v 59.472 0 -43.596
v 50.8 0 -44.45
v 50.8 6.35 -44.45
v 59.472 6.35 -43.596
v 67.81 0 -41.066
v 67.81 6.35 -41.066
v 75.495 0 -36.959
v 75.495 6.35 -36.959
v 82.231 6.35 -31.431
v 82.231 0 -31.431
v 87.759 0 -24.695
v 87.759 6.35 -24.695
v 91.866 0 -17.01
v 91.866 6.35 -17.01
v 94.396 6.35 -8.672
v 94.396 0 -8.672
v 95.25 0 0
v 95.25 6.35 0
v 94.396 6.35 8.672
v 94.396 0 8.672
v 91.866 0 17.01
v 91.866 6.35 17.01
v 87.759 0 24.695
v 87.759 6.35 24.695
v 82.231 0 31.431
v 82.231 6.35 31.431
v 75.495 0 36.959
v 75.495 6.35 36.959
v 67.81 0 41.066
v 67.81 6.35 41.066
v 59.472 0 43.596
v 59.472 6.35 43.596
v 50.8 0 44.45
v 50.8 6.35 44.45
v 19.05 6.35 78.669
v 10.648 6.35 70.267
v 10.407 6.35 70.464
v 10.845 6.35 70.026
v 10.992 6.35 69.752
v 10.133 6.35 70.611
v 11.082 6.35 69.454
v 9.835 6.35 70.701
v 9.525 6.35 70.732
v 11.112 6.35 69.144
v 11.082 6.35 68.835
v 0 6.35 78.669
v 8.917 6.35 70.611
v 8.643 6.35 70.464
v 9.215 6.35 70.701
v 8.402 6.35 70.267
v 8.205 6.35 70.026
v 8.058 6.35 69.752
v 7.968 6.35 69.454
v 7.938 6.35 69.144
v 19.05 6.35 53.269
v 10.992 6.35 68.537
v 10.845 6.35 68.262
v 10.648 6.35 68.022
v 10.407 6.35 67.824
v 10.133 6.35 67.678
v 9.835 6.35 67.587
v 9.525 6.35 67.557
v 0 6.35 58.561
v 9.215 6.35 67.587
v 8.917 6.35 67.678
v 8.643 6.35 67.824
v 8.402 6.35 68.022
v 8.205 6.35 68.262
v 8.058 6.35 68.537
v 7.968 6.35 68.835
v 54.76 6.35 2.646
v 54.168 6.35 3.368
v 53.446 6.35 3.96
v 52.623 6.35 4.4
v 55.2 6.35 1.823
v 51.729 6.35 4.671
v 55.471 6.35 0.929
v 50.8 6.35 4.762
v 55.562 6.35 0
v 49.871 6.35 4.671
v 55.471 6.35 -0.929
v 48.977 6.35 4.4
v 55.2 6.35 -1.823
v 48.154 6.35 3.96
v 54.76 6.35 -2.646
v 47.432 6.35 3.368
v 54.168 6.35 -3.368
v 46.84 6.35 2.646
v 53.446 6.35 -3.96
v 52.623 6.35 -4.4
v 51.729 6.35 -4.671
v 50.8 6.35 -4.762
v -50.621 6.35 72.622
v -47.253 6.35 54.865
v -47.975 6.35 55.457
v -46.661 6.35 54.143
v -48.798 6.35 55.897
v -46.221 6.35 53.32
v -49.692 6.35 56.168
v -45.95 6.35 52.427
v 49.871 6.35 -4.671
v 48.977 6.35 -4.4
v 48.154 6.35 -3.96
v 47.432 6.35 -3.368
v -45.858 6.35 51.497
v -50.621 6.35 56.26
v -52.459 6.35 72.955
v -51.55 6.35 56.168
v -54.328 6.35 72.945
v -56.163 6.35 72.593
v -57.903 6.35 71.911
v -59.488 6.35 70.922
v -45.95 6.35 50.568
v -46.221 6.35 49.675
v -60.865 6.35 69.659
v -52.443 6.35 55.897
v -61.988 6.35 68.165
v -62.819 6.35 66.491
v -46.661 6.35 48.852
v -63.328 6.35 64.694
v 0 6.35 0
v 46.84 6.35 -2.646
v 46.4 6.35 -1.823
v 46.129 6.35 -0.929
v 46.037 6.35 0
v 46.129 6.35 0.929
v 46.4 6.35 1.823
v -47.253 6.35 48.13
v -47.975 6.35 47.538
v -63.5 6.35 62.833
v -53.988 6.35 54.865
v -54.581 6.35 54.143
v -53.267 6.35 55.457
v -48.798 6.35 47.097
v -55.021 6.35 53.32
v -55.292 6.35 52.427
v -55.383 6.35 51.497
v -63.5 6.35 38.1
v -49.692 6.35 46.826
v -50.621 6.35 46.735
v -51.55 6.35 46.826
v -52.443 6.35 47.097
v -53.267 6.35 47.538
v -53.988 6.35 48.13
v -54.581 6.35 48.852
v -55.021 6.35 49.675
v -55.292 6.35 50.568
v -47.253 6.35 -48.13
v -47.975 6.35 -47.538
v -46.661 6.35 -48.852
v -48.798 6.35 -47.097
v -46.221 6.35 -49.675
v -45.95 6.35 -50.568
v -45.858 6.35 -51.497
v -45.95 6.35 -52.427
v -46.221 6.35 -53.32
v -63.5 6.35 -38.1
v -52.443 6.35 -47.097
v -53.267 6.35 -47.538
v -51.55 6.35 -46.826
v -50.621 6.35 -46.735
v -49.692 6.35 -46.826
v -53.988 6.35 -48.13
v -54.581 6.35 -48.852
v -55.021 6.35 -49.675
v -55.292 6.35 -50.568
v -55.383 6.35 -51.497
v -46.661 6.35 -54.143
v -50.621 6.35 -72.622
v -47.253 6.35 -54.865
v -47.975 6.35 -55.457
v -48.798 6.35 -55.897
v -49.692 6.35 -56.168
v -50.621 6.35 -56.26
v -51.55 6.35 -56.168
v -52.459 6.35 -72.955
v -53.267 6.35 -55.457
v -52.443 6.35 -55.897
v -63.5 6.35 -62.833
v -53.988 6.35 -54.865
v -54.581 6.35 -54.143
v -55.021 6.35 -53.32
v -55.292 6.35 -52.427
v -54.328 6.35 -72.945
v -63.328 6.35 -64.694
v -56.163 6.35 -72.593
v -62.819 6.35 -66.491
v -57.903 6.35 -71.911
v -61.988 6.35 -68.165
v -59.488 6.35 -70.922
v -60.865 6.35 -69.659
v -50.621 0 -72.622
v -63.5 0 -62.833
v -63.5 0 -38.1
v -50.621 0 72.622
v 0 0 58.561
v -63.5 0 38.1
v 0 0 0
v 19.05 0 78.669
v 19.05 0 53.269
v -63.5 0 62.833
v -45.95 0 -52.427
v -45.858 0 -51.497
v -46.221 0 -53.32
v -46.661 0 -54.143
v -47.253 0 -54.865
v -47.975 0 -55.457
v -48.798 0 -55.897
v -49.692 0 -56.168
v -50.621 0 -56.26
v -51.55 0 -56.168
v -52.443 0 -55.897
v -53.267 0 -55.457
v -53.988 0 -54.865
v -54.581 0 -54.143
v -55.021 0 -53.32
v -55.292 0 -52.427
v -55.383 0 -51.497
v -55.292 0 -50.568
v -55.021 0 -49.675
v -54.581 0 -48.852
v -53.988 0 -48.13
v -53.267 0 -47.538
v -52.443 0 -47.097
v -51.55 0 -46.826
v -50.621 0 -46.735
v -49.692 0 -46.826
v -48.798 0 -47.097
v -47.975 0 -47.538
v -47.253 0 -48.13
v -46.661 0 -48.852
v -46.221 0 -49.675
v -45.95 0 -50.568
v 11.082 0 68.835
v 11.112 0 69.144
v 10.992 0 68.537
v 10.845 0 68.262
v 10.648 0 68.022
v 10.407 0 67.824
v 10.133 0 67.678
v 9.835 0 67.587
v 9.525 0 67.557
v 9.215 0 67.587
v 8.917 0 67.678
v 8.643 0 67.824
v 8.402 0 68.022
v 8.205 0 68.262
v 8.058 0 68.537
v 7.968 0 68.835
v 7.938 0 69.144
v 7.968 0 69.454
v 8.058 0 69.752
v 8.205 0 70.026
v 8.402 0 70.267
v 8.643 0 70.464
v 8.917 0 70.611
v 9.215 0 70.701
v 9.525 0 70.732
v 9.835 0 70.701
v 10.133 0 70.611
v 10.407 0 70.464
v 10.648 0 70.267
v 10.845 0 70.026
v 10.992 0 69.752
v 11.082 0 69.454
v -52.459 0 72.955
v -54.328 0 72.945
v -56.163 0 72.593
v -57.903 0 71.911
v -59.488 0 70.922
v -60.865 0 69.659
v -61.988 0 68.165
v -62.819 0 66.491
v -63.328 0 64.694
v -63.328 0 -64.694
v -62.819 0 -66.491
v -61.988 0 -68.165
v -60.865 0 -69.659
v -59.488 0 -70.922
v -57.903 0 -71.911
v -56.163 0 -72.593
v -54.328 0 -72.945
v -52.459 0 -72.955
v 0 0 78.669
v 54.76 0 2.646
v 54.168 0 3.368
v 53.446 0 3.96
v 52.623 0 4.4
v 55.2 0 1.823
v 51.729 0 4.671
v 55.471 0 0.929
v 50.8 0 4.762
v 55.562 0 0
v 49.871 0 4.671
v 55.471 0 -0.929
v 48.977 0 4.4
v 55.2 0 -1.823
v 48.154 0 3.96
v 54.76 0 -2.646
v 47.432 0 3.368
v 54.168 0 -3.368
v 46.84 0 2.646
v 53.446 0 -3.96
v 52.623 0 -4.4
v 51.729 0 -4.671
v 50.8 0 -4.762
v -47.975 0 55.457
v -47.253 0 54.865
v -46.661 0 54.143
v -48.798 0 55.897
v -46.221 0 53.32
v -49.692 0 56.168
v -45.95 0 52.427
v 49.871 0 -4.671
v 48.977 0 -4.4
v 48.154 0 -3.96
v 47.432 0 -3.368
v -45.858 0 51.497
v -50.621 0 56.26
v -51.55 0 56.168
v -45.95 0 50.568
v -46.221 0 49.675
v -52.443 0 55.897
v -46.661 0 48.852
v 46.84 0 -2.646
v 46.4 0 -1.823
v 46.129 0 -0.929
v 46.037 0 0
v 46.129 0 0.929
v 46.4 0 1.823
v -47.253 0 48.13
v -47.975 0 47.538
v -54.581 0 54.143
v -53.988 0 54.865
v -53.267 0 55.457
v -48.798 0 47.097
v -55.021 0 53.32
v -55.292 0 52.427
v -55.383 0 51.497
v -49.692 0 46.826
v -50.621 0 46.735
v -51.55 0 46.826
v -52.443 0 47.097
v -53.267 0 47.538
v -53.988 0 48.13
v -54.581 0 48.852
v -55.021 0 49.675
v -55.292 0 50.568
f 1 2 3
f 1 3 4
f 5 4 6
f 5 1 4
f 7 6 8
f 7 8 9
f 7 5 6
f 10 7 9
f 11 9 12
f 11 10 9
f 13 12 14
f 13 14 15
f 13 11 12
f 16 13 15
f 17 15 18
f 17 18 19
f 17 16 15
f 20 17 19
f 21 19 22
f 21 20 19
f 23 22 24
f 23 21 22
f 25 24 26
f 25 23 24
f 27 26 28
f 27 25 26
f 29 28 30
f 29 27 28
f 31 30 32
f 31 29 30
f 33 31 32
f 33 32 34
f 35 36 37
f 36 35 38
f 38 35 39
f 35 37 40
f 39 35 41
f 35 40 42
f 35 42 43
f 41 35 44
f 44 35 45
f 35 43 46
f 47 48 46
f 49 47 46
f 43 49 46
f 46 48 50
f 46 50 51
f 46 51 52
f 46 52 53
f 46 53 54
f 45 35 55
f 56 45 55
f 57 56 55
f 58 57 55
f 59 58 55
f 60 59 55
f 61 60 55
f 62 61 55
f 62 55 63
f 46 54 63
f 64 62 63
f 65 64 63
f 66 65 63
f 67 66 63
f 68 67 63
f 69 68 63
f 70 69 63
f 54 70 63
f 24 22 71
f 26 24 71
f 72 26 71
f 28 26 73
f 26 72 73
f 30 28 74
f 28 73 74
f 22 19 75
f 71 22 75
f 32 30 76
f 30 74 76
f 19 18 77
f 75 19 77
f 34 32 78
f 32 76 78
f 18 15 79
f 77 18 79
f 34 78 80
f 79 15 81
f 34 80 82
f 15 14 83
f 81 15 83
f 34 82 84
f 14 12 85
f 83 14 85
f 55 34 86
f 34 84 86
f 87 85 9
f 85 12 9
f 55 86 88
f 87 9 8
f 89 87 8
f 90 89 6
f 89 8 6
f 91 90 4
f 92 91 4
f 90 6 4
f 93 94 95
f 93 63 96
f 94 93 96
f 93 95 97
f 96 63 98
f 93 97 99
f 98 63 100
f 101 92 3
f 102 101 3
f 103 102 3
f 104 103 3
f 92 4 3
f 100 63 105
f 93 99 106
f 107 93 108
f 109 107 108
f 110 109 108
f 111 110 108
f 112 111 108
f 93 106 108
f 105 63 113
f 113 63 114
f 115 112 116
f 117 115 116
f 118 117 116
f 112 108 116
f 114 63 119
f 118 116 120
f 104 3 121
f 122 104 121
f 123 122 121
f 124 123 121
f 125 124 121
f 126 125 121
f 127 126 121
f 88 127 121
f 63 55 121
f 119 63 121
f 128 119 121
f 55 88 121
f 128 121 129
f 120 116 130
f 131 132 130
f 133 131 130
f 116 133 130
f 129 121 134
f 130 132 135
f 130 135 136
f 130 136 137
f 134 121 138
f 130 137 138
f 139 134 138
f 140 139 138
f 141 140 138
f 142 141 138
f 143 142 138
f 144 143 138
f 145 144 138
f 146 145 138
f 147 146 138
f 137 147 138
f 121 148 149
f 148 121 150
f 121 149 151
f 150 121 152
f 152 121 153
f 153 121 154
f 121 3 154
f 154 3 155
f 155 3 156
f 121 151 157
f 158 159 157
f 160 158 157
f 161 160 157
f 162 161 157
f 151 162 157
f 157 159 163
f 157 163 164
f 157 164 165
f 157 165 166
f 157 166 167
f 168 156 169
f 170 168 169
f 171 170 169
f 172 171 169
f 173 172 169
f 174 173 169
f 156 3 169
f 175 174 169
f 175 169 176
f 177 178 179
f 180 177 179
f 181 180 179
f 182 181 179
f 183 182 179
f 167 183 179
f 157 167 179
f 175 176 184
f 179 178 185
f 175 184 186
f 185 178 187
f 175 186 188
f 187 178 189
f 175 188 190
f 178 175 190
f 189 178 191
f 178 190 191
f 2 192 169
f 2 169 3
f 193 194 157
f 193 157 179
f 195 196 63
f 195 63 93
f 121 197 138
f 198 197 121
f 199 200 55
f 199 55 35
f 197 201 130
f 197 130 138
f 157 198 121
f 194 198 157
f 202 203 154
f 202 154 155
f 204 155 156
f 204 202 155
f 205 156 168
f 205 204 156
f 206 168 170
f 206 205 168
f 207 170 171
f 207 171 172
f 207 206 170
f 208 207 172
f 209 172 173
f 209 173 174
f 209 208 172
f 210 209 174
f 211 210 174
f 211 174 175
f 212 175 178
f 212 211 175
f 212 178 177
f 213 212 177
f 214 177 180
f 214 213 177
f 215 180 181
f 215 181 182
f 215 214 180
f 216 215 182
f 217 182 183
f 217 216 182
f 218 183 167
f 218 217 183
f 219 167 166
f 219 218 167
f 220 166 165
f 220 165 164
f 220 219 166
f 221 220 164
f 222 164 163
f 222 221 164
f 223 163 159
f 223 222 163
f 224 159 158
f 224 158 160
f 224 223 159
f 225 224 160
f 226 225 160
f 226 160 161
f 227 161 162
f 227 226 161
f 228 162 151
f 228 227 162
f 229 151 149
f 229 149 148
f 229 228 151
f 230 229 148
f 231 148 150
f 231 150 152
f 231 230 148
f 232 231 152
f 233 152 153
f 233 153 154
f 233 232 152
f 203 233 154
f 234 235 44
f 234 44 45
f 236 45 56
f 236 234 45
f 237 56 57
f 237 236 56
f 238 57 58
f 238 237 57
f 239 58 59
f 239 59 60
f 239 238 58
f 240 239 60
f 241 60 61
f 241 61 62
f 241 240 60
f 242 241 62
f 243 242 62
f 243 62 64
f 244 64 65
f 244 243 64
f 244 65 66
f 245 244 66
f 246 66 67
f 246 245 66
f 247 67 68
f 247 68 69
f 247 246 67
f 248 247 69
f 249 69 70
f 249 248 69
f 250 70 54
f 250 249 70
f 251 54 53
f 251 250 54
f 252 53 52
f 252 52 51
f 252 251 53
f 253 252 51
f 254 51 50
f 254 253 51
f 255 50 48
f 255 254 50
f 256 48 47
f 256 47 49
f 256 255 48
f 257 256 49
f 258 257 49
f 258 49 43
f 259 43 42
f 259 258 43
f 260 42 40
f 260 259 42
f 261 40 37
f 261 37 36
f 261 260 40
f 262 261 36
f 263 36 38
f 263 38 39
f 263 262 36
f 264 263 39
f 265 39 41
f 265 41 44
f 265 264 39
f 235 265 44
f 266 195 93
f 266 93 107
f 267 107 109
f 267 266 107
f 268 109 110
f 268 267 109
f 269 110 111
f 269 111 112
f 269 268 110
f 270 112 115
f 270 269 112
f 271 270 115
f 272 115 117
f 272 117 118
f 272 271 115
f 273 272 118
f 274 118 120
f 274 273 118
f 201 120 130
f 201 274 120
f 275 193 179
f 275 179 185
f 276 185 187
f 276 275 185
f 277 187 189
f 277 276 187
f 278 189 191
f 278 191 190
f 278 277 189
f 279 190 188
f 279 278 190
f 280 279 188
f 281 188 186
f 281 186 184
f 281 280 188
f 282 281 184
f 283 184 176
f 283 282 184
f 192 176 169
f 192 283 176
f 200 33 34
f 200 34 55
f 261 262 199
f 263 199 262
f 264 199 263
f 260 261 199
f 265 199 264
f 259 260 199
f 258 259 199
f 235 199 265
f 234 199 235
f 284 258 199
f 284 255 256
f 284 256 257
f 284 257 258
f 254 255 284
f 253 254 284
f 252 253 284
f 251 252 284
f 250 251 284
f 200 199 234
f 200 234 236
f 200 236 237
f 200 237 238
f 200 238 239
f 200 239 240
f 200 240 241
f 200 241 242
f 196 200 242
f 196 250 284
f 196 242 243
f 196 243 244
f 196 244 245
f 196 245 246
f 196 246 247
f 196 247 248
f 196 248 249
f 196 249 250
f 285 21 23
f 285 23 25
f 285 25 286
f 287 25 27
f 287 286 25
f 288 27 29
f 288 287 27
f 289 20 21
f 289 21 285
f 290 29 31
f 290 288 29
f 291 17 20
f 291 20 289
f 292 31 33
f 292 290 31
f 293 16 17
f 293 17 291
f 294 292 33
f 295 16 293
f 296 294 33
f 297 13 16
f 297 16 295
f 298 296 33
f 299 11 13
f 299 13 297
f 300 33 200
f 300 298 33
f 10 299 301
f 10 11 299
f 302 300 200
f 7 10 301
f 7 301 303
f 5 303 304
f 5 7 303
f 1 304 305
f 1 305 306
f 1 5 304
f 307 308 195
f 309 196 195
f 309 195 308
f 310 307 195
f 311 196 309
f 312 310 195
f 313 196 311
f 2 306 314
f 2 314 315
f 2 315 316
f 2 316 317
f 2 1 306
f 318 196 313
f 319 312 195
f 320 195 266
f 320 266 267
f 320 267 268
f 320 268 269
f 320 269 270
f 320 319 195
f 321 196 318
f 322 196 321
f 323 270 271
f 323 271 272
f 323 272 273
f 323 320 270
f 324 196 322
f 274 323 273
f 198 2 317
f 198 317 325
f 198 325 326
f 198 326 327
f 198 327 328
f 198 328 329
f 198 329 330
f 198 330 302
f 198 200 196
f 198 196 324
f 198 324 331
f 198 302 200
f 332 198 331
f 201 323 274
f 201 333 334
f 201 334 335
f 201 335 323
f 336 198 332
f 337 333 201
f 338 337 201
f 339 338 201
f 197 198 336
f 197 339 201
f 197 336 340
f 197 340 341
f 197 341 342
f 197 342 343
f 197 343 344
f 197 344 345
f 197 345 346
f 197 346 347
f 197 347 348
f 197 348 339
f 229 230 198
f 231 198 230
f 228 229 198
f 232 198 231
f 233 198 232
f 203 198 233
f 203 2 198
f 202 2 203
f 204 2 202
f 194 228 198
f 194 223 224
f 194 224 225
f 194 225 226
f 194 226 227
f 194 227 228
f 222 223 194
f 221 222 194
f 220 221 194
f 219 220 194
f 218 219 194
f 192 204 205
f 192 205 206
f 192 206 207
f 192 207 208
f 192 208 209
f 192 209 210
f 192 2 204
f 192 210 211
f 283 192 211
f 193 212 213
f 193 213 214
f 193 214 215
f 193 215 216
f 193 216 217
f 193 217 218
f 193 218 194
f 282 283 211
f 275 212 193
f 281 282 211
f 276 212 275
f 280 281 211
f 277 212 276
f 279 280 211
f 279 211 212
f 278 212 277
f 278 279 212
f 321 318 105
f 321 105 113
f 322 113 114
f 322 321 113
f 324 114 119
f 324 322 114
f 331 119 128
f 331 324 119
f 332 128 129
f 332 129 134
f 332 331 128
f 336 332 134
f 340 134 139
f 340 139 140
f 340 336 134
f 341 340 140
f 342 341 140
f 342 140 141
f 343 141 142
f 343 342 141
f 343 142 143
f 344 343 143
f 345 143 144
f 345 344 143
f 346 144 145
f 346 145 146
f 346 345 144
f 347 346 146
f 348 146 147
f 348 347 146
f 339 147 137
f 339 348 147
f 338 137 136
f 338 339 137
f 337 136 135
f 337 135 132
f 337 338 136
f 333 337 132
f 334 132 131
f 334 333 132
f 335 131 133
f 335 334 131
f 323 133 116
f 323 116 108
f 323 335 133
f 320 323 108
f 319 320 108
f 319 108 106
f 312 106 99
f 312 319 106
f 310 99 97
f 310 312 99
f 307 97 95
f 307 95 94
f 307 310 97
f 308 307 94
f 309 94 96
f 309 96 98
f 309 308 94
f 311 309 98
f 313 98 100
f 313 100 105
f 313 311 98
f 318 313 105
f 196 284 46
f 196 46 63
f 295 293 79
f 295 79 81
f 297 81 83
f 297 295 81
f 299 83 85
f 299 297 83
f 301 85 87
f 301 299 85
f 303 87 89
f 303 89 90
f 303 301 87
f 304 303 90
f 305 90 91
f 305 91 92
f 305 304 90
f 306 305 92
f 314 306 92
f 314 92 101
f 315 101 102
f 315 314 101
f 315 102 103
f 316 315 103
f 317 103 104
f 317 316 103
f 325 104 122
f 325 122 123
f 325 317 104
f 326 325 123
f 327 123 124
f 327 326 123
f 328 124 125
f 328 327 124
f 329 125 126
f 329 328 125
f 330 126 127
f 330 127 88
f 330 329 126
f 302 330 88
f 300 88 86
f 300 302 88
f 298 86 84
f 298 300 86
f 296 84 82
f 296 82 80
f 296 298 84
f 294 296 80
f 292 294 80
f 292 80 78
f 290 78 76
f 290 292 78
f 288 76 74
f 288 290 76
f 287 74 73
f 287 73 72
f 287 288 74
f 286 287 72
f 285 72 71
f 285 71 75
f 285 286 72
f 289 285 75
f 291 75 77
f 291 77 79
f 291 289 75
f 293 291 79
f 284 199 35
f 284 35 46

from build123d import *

# Parameters (mm, degrees)
SKETCH1_R           = 4.7625
SKETCH1_R_2         = 1.5875
BOSS_EXTRUDE1_DEPTH = 6.35


with BuildPart() as part:
    # Sketch1 → Boss-Extrude1 (new body)
    with BuildSketch(Plane(origin=(0, 0, 0), x_dir=(1, 0, 0), z_dir=(0, 1, 0))):
        with BuildLine():
            Line((-50.620738344, 72.622427318), (50.8, 44.45))
            ThreePointArc((50.8, 44.45), (95.25, 0), (50.8, -44.45))
            Line((50.8, -44.45), (19.05, -53.269444444))
            Line((19.05, -53.269444444), (19.05, -78.669444444))
            Line((19.05, -78.669444444), (0, -78.669444444))
            Line((0, -78.669444444), (0, -58.561111111))
            Line((0, -58.561111111), (-50.620738344, -72.622427318))
            ThreePointArc((-50.620738344, -72.622427318), (-59.488085132, -70.921759488), (-63.5, -62.833085356))
            Line((-63.5, -62.833085356), (-63.5, -38.1))
            Line((-63.5, -38.1), (0, 0))
            Line((0, 0), (-63.5, 38.1))
            Line((-63.5, 38.1), (-63.5, 62.833085356))
            ThreePointArc((-63.5, 62.833085356), (-59.488085132, 70.921759488), (-50.620738344, 72.622427318))
        make_face()
        with Locations((50.8, 0)):
            Circle(SKETCH1_R, mode=Mode.SUBTRACT)
        with Locations((-50.620738344, 51.497435162)):
            Circle(SKETCH1_R, mode=Mode.SUBTRACT)
        with Locations((-50.620738344, -51.497435162)):
            Circle(SKETCH1_R, mode=Mode.SUBTRACT)
        with Locations((9.525, -69.144444444)):
            Circle(SKETCH1_R_2, mode=Mode.SUBTRACT)
    extrude(amount=BOSS_EXTRUDE1_DEPTH)


solid = part.part
